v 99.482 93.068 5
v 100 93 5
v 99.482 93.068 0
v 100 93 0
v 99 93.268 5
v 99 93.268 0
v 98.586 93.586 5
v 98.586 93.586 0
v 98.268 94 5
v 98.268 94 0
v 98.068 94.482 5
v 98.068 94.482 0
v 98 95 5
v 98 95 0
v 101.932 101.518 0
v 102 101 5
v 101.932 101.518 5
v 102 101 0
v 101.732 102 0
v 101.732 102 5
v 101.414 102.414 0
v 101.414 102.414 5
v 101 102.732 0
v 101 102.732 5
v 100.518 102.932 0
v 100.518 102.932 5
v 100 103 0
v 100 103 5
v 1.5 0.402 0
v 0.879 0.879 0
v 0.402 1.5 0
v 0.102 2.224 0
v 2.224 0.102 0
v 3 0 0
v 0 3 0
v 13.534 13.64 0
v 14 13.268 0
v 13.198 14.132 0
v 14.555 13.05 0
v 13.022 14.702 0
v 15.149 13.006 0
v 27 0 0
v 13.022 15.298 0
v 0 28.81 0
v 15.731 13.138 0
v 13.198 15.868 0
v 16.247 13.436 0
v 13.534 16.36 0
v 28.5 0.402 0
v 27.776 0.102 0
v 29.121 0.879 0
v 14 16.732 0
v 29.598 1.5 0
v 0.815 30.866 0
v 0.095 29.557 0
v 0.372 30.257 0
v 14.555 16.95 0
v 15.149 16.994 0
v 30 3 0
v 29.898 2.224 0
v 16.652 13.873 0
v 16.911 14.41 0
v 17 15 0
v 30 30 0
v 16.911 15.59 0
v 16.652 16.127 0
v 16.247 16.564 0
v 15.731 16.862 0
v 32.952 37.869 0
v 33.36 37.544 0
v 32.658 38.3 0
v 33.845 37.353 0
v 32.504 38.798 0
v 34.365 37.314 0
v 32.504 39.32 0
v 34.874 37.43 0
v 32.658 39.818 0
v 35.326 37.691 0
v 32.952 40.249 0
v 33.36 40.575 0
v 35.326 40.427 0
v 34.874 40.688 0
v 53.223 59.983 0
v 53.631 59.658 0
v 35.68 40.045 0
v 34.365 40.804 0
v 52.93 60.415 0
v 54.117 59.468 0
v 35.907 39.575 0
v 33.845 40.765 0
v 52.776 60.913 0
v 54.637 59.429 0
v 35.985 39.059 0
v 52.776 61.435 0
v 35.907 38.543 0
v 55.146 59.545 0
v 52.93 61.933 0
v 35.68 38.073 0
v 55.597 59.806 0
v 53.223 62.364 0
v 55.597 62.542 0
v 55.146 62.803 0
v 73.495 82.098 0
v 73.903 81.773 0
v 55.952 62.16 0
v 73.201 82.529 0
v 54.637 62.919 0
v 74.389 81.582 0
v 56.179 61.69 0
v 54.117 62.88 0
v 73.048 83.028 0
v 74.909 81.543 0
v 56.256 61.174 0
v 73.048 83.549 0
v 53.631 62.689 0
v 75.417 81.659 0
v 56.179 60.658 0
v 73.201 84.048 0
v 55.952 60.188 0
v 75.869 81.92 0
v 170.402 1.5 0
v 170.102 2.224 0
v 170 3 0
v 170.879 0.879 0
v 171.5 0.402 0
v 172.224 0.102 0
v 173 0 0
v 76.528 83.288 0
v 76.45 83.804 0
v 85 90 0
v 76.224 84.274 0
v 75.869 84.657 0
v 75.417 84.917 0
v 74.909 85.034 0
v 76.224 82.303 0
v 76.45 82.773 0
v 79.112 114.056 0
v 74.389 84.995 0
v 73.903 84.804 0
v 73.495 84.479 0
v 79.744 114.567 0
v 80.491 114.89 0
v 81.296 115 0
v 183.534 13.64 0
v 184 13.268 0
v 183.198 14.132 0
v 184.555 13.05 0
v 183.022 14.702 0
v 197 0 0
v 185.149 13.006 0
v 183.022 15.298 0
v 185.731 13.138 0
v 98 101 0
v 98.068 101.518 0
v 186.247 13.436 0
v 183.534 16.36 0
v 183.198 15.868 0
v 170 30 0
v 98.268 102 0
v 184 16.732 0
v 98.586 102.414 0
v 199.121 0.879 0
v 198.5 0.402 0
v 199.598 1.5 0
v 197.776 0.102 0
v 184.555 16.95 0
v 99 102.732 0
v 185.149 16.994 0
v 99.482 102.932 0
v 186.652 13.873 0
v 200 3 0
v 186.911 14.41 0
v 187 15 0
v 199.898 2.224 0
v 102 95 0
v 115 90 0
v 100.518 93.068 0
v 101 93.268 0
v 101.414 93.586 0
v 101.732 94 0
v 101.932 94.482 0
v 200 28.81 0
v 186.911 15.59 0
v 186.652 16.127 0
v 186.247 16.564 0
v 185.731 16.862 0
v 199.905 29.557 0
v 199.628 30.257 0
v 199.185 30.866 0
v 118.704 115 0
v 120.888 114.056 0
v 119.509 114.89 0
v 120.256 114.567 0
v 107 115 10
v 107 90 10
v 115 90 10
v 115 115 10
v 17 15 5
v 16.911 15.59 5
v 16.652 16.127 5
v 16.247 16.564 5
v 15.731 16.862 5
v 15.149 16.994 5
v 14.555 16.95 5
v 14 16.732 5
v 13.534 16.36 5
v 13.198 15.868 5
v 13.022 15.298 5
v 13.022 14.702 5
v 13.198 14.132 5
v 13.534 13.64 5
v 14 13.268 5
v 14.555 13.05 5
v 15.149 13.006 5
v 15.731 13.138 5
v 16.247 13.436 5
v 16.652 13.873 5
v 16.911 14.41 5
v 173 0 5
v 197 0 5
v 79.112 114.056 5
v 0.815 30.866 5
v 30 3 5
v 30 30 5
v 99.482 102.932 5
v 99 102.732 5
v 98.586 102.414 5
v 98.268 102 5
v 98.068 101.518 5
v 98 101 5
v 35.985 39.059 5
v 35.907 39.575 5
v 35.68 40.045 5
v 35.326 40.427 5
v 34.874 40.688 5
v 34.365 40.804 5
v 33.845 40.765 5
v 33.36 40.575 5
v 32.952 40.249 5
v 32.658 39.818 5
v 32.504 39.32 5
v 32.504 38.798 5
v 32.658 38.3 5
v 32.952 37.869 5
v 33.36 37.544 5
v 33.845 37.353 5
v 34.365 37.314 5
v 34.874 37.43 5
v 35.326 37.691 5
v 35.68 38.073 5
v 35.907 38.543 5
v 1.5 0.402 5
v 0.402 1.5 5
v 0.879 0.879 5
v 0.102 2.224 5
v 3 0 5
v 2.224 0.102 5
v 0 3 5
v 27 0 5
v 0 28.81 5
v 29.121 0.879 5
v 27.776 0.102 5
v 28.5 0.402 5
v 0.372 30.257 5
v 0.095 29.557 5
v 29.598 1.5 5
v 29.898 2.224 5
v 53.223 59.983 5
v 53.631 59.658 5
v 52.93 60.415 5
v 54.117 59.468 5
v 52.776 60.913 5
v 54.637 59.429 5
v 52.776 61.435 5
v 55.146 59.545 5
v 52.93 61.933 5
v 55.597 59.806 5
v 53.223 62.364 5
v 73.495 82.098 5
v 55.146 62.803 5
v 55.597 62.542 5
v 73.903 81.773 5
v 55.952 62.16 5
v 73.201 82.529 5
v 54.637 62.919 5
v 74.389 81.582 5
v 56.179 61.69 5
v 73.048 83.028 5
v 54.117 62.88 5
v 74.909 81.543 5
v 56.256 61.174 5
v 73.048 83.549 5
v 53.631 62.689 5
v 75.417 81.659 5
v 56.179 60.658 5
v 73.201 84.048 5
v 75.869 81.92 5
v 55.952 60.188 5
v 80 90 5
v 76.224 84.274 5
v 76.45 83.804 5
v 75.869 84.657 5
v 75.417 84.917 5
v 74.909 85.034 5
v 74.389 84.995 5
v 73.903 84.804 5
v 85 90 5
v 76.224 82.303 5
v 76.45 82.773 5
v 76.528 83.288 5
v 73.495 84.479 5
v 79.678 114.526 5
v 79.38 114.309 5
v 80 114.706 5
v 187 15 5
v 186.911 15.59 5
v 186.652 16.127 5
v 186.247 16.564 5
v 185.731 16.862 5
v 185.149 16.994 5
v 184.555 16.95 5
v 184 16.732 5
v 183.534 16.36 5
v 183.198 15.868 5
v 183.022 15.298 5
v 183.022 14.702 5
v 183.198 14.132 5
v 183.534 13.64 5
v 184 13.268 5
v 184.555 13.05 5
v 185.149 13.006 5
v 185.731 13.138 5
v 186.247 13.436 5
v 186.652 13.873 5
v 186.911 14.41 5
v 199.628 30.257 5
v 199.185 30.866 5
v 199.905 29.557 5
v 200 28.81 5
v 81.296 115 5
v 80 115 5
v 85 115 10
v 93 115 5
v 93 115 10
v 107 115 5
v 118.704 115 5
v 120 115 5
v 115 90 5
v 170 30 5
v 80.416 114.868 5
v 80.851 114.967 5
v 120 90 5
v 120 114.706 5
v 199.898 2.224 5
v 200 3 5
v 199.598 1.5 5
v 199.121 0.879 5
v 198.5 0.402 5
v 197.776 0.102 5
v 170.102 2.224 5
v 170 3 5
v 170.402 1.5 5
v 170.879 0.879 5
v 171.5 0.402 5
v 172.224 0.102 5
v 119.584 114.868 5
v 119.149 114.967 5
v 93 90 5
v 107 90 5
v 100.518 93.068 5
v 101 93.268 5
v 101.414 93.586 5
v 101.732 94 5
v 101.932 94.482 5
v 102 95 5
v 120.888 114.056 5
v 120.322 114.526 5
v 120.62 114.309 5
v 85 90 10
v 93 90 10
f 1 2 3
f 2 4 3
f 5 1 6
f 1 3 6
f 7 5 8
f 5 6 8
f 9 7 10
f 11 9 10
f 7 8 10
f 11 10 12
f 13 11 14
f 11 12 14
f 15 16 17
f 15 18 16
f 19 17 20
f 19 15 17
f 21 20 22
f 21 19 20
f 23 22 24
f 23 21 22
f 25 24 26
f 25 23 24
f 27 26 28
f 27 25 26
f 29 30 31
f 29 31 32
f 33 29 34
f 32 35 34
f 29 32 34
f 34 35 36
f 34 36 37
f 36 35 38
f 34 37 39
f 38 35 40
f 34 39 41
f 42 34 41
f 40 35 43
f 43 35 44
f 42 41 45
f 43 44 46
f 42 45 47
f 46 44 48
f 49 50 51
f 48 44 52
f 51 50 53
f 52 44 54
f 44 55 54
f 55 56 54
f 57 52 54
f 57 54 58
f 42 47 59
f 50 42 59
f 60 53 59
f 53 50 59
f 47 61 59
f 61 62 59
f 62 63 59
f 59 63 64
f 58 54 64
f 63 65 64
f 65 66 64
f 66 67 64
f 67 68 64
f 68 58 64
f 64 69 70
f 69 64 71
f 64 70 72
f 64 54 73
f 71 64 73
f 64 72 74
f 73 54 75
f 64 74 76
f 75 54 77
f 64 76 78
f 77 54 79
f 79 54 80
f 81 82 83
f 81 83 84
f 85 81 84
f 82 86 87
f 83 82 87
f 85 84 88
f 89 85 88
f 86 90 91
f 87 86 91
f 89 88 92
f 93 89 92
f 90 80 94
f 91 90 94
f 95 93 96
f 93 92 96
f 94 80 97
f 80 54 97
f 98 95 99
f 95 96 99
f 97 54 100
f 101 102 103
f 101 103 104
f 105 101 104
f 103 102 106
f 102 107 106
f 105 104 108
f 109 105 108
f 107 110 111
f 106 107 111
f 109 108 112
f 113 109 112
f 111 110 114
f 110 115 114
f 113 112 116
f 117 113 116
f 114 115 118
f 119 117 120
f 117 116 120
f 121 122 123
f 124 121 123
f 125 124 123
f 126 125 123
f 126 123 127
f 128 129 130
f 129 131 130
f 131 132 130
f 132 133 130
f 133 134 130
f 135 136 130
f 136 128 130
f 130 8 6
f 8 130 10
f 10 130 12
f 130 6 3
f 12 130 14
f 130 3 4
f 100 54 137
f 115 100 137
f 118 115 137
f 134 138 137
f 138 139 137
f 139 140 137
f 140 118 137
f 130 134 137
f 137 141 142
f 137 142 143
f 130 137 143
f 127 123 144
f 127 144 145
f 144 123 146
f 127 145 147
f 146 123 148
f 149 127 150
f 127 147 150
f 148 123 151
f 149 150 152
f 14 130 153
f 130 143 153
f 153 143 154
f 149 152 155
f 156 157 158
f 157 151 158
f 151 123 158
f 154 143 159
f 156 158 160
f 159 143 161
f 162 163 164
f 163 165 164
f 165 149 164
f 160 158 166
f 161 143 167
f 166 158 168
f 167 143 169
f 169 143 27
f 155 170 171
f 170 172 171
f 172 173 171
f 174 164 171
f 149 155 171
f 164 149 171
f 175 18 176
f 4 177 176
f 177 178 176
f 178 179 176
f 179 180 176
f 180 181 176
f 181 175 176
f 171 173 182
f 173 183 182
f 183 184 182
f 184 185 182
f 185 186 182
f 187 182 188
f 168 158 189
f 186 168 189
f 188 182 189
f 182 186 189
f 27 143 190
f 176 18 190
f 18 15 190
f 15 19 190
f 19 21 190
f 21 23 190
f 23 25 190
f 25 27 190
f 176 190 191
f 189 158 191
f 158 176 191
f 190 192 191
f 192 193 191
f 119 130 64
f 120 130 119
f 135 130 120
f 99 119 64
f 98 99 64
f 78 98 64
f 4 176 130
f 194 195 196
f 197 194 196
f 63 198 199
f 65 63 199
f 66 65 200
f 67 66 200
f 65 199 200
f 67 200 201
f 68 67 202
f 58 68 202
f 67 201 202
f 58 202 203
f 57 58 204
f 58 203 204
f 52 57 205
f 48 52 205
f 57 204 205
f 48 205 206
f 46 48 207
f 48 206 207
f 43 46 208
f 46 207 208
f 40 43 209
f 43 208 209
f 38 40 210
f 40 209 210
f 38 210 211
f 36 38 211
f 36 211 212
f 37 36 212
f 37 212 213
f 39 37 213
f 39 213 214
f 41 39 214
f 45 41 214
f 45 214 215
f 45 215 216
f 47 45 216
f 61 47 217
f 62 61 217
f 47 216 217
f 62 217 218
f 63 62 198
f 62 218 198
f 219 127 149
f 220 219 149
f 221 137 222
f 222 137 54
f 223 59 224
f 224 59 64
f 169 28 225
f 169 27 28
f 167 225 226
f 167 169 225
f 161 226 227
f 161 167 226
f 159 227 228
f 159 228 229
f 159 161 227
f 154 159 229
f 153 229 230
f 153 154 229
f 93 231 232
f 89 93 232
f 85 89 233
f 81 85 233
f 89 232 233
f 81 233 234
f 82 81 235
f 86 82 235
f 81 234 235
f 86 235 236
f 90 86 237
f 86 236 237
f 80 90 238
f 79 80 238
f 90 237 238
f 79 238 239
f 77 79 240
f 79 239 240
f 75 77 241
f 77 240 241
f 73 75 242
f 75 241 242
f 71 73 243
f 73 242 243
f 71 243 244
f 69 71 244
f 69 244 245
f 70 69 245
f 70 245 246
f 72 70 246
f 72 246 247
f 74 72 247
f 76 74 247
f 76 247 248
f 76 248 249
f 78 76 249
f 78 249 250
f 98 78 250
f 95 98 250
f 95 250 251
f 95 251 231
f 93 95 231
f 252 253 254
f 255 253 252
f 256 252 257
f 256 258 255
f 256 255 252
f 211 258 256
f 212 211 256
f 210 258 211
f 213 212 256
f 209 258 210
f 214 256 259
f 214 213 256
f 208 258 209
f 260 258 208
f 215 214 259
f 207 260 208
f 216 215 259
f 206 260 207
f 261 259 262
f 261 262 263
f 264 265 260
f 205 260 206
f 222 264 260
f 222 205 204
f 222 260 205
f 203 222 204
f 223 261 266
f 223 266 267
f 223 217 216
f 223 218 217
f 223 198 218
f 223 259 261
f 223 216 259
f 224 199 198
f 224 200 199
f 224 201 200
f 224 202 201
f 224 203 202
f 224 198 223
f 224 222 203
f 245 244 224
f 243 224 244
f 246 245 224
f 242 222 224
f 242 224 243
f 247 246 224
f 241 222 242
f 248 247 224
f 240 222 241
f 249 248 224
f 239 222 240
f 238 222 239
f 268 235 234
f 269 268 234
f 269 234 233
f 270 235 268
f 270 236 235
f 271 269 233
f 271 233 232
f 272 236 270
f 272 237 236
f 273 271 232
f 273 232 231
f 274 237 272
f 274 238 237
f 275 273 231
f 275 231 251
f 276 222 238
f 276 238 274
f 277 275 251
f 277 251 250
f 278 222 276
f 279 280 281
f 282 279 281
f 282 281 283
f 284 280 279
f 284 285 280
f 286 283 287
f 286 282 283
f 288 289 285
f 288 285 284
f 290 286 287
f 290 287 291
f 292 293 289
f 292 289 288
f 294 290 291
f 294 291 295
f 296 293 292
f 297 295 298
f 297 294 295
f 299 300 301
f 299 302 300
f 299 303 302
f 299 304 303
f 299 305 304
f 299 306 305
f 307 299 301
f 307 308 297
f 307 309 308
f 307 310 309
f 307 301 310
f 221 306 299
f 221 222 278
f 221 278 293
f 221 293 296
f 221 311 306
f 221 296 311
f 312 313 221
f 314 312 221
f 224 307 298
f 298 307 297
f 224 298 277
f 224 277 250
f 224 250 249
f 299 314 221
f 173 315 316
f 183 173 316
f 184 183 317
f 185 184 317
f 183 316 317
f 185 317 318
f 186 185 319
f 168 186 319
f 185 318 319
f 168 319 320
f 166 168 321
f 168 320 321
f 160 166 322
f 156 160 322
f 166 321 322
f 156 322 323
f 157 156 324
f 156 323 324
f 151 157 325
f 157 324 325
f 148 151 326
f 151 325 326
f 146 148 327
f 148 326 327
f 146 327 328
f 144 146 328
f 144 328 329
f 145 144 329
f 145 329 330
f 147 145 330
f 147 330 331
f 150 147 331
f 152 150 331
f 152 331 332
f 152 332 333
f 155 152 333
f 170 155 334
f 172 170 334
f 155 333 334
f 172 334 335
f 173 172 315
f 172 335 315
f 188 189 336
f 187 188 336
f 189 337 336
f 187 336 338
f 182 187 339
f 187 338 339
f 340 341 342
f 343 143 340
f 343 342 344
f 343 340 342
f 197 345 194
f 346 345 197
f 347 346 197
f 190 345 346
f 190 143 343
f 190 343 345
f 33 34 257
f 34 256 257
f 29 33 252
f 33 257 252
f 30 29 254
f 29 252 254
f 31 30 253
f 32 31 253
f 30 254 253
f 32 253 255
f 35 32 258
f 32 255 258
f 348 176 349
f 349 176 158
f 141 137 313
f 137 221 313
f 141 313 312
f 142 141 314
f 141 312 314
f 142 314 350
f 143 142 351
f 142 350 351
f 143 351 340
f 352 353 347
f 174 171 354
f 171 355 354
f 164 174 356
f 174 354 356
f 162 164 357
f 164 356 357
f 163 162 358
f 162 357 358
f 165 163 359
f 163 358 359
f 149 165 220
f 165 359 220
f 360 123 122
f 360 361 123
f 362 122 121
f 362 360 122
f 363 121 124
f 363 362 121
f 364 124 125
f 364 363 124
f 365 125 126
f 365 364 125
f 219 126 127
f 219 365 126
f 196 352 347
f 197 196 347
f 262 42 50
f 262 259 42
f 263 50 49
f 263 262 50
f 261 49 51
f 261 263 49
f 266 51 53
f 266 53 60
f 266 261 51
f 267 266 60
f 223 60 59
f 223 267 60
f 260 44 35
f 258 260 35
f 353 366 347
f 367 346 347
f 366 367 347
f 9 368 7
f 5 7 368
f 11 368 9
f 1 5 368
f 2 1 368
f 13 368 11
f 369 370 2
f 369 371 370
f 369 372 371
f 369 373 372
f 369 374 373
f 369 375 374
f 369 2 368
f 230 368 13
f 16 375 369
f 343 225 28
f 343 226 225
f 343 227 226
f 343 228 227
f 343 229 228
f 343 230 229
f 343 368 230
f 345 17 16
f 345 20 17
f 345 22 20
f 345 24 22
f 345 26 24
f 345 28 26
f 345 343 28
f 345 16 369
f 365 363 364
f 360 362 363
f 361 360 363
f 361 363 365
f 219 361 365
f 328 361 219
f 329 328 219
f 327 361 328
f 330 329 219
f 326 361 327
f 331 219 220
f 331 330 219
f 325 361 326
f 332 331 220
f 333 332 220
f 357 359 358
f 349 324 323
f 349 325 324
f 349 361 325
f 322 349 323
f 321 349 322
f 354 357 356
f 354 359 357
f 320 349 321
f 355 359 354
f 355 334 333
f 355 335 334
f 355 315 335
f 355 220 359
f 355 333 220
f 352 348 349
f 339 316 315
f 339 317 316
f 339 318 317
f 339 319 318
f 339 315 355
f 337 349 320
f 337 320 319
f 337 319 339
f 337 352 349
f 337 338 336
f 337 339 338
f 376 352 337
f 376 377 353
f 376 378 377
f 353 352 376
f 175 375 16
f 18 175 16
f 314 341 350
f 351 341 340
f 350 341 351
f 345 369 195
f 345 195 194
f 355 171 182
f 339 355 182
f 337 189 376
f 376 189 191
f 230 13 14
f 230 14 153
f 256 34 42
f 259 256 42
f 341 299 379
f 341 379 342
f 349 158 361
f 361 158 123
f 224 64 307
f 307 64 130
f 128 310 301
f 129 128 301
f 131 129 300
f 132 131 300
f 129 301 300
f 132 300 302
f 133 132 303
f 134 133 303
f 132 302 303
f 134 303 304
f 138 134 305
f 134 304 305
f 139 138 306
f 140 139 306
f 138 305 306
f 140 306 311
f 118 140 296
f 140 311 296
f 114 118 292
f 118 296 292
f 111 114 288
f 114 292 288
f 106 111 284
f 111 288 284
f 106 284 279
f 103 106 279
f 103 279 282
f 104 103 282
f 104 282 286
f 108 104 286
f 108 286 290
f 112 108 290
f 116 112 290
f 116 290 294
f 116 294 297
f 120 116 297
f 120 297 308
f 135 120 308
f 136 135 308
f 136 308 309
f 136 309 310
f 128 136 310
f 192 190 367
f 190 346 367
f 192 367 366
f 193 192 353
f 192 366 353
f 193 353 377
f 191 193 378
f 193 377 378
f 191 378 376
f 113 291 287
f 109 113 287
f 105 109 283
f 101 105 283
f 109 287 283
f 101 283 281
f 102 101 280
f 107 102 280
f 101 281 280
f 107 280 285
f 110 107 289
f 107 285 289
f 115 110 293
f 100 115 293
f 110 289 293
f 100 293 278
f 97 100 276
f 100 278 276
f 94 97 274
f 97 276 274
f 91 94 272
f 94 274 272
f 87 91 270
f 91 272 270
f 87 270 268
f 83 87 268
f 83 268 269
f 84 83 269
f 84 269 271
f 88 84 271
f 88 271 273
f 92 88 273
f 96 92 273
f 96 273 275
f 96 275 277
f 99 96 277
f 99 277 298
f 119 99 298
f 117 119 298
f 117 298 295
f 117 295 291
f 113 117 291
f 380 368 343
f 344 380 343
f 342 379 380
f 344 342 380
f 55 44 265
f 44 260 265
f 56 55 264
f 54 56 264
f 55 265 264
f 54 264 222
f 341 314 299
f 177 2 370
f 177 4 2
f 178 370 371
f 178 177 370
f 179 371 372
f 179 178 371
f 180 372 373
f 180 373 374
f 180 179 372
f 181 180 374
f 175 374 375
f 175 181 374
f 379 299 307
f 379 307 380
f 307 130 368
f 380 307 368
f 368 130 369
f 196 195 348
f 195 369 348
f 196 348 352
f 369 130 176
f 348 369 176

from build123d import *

# Parameters (mm, degrees)
DODANIE_WYCI_GNI_CIE1_DEPTH = 5
SZKIC3_R                    = 2
WYTNIJ_WYCI_GNI_CIE1_DEPTH  = 5
SZKIC4_W                    = 4
SZKIC4_H                    = 10
WYTNIJ_WYCI_GNI_CIE2_DEPTH  = 5
ZAOKR_GLENIE1_R             = 3
ZAOKR_GLENIE2_R             = 2
SZKIC5_W                    = 13
SZKIC5_H                    = 25
DODANIE_WYCI_GNI_CIE2_DEPTH = 5
SFAZOWANIE1_SIZE            = 5
WYTNIJ_WYCI_GNI_CIE3_REACH  = 232.76
SZKIC6_R                    = 1.75


with BuildPart() as part:
    # Szkic2 → Dodanie-wyciągnięcie1 (new body)
    with BuildSketch(Plane.XY):
        Polygon((0, 0), (30, 0), (30, 30), (85, 90), (115, 90), (170, 30), (170, 0), (200, 0), (200, 30), (120, 115), (80, 115), (0, 30), align=None)
    extrude(amount=DODANIE_WYCI_GNI_CIE1_DEPTH)

    # Szkic3 → Wytnij-wyciągnięcie1 (cut)
    with BuildSketch(Plane.XY.offset(5)):
        with Locations((15, 15)):
            Circle(SZKIC3_R)
        with Locations((185, 15)):
            Circle(SZKIC3_R)
    extrude(amount=-WYTNIJ_WYCI_GNI_CIE1_DEPTH, mode=Mode.SUBTRACT)

    # Szkic4 → Wytnij-wyciągnięcie2 (cut)
    with BuildSketch(Plane.XY.offset(5)):
        with Locations((100, 98)):
            Rectangle(SZKIC4_W, SZKIC4_H)
    extrude(amount=-WYTNIJ_WYCI_GNI_CIE2_DEPTH, mode=Mode.SUBTRACT)

    # Zaokrąglenie1
    zaokr_glenie1_edges = [part.edges().sort_by_distance(p)[0] for p in [
        (0, 30, 2.5),
        (80, 115, 2.5),
        (120, 115, 2.5),
        (200, 30, 2.5),
        (200, 0, 2.5),
        (170, 0, 2.5),
        (30, 0, 2.5),
        (0, 0, 2.5),
    ]]
    fillet(zaokr_glenie1_edges, radius=ZAOKR_GLENIE1_R)

    # Zaokrąglenie2
    zaokr_glenie2_edges = [part.edges().sort_by_distance(p)[0] for p in [
        (98, 103, 2.5),
        (102, 103, 2.5),
        (102, 93, 2.5),
        (98, 93, 2.5),
    ]]
    fillet(zaokr_glenie2_edges, radius=ZAOKR_GLENIE2_R - 0.0001)  # a hair under: the kernel refuses the full size

    # Szkic5 → Dodanie-wyciągnięcie2 (add)
    with BuildSketch(Plane.XY.offset(5)):
        with Locations((113.5, 102.5)):
            Rectangle(SZKIC5_W, SZKIC5_H)
        with Locations((86.5, 102.5)):
            Rectangle(SZKIC5_W, SZKIC5_H)
    extrude(amount=DODANIE_WYCI_GNI_CIE2_DEPTH)

    # Sfazowanie1
    sfazowanie1_edges = [part.edges().sort_by_distance(p)[0] for p in [
        (80, 102.5, 10),
        (120, 102.5, 10),
    ]]
    chamfer(sfazowanie1_edges, length=SFAZOWANIE1_SIZE - 0.0001)  # a hair under: the kernel refuses the full size

    # Szkic6 → Wytnij-wyciągnięcie3 (cut, up to next)
    with BuildSketch(Plane.XY.offset(5), mode=Mode.PRIVATE) as wytnij_wyci_gni_cie3_sk1:
        with Locations((74.778017415, 83.288424616)):
            Circle(SZKIC6_R)
    wytnij_wyci_gni_cie3_tool1 = extrude(wytnij_wyci_gni_cie3_sk1.sketch, amount=-WYTNIJ_WYCI_GNI_CIE3_REACH, mode=Mode.PRIVATE) & part.part
    # Szkic6 → Wytnij-wyciągnięcie3 (cut, up to next)
    with BuildSketch(Plane.XY.offset(5), mode=Mode.PRIVATE) as wytnij_wyci_gni_cie3_sk2:
        with Locations((34.234539704, 39.059176204)):
            Circle(SZKIC6_R)
    wytnij_wyci_gni_cie3_tool2 = extrude(wytnij_wyci_gni_cie3_sk2.sketch, amount=-WYTNIJ_WYCI_GNI_CIE3_REACH, mode=Mode.PRIVATE) & part.part
    # Szkic6 → Wytnij-wyciągnięcie3 (cut, up to next)
    with BuildSketch(Plane.XY.offset(5), mode=Mode.PRIVATE) as wytnij_wyci_gni_cie3_sk3:
        with Locations((54.50627856, 61.17380041)):
            Circle(SZKIC6_R)
    wytnij_wyci_gni_cie3_tool3 = extrude(wytnij_wyci_gni_cie3_sk3.sketch, amount=-WYTNIJ_WYCI_GNI_CIE3_REACH, mode=Mode.PRIVATE) & part.part
    add(wytnij_wyci_gni_cie3_tool1.solids().sort_by_distance((74.778017, 83.288425, 5))[0], mode=Mode.SUBTRACT)
    add(wytnij_wyci_gni_cie3_tool2.solids().sort_by_distance((34.23454, 39.059176, 5))[0], mode=Mode.SUBTRACT)
    add(wytnij_wyci_gni_cie3_tool3.solids().sort_by_distance((54.506279, 61.1738, 5))[0], mode=Mode.SUBTRACT)


solid = part.part
